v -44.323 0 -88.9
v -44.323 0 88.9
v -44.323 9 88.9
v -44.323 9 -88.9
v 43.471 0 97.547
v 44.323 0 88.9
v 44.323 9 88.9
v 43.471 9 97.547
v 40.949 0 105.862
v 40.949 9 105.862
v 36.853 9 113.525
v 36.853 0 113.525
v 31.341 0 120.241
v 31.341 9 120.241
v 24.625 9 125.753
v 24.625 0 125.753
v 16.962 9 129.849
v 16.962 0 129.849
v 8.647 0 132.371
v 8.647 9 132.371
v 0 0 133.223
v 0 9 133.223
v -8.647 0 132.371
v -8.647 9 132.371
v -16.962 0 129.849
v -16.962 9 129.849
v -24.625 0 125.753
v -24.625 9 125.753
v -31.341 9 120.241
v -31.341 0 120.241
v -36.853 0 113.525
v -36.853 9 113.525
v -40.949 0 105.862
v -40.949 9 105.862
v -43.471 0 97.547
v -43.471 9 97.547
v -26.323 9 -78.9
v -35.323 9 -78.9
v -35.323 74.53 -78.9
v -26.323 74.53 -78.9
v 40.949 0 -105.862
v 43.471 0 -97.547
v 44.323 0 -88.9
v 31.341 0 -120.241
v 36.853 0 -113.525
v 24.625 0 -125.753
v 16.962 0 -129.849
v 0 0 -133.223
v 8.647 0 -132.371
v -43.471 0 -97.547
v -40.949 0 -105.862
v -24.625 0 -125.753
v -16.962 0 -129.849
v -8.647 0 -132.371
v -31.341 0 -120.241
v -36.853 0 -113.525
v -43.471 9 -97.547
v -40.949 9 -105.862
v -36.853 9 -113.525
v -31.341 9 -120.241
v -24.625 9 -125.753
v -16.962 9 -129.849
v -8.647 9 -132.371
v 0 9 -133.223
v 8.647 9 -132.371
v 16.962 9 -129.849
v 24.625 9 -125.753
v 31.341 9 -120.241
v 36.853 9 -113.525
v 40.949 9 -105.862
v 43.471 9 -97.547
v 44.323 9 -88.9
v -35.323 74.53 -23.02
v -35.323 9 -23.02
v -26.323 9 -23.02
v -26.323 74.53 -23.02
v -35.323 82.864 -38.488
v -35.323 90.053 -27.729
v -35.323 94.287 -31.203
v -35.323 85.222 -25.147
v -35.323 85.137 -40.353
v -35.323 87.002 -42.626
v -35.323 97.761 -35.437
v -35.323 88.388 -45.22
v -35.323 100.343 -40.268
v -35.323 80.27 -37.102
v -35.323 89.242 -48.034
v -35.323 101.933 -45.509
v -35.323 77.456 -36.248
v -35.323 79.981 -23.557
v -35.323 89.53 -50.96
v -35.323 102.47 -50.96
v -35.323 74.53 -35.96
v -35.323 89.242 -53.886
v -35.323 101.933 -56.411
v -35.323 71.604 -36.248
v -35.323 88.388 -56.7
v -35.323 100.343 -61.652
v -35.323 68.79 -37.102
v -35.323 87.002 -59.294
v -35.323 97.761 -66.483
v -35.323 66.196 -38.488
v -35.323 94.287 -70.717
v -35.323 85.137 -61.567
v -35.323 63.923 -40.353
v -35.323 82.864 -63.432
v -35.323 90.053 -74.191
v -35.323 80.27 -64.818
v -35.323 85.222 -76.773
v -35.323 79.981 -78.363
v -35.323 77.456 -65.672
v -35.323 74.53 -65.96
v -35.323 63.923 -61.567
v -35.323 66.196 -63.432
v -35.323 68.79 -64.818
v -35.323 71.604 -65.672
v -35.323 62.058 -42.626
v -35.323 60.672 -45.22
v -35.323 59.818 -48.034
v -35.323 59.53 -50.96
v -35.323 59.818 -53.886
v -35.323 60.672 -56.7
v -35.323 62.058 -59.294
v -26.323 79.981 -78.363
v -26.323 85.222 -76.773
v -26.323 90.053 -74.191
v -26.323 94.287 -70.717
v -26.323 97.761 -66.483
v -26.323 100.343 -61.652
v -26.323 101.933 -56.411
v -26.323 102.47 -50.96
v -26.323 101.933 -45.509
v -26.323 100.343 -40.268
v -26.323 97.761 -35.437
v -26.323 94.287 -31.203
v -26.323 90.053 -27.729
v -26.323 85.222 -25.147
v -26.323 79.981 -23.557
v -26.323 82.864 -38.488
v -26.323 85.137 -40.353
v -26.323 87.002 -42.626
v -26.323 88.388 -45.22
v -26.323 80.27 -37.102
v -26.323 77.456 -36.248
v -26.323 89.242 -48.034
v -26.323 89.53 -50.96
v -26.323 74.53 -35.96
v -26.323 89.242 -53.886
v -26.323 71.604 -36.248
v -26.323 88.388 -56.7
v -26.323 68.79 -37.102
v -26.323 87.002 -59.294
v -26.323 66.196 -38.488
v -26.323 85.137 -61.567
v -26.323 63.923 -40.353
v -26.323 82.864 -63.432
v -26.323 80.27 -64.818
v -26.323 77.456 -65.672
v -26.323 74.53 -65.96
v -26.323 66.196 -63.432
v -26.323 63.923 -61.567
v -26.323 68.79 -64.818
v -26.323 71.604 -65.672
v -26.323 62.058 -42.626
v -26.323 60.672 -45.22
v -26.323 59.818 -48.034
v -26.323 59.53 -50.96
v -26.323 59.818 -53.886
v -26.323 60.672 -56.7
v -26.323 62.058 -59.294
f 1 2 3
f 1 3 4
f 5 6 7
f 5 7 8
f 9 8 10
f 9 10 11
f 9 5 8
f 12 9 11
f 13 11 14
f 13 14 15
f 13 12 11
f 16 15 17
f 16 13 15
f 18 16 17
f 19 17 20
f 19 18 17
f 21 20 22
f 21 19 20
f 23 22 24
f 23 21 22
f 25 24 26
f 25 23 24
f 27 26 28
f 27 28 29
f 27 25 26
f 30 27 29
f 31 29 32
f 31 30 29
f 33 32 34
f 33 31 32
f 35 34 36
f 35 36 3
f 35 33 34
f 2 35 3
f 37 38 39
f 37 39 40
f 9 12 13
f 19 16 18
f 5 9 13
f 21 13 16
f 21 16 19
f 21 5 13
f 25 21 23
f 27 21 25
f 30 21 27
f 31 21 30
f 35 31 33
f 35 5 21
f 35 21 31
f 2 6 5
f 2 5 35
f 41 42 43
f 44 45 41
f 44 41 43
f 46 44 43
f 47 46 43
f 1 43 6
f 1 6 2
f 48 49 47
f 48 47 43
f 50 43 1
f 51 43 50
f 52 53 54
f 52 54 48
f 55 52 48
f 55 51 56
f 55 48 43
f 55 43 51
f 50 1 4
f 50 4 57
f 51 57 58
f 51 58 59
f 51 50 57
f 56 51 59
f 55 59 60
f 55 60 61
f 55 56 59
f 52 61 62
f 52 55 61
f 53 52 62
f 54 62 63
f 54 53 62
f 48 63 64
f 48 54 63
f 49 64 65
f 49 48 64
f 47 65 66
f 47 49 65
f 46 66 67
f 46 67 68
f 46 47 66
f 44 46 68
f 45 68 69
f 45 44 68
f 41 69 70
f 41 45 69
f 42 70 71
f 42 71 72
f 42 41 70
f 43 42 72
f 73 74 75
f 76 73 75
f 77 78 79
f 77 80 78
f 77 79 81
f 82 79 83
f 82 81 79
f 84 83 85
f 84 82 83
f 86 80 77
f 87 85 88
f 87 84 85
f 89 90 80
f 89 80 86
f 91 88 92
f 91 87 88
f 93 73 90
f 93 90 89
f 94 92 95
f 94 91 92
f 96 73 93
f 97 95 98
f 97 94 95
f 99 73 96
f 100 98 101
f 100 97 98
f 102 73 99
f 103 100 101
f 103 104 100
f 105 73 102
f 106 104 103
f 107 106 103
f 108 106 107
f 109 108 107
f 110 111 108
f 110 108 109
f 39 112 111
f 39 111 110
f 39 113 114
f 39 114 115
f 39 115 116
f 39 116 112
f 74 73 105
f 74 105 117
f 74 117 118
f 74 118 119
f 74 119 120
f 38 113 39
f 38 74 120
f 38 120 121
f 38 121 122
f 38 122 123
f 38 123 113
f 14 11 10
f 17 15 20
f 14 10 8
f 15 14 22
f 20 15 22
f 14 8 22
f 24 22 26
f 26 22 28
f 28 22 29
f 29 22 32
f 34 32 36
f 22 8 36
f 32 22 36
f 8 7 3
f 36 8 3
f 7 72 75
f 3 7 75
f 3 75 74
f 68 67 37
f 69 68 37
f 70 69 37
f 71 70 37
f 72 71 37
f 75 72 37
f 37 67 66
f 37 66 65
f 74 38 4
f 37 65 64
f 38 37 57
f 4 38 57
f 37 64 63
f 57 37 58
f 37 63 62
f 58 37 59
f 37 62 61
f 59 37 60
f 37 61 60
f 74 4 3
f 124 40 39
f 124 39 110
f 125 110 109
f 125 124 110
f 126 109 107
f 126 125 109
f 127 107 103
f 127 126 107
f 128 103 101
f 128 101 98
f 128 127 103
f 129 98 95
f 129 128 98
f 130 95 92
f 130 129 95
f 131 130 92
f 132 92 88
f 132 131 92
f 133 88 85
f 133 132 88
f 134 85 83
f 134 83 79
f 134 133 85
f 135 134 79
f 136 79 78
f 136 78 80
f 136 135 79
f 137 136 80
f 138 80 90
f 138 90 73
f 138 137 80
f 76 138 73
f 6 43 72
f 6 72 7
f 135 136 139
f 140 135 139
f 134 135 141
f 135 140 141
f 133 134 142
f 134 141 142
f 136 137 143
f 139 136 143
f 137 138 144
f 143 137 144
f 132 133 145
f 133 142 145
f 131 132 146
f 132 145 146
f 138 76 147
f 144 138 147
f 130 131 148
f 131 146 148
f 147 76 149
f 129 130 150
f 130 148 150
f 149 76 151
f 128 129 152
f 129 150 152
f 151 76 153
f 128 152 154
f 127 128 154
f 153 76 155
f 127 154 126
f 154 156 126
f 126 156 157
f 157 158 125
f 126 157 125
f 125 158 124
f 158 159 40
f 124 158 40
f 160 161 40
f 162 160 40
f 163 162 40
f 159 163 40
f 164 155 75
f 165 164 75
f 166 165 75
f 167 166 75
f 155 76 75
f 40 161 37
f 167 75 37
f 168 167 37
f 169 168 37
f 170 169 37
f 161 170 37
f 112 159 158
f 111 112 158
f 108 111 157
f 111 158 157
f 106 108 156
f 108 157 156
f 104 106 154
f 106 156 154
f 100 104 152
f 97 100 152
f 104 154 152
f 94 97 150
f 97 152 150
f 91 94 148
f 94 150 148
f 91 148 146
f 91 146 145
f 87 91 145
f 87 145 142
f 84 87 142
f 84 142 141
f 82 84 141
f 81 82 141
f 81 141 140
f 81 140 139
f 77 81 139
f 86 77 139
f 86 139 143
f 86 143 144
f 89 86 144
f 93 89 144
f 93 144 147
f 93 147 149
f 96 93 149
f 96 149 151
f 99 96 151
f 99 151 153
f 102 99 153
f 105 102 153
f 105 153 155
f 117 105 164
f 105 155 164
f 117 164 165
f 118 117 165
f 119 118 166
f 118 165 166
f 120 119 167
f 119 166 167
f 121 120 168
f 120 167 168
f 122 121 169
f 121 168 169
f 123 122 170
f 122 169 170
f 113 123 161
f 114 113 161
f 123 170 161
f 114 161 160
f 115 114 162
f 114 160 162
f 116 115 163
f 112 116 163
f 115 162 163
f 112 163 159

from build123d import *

# Parameters (mm, degrees)
BOSS_EXTRUDE1_DEPTH = 9
SKETCH2_W           = 9
SKETCH2_H           = 55.88
BOSS_EXTRUDE2_DEPTH = 65.53
SKETCH3_R           = 27.94
BOSS_EXTRUDE3_DEPTH = 9
SKETCH4_R           = 15
CUT_EXTRUDE1_DEPTH  = 19


with BuildPart() as part:
    # Sketch1 → Boss-Extrude1 (new body)
    with BuildSketch(Plane(origin=(0, 0, 0), x_dir=(1, 0, 0), z_dir=(0, 1, 0))):
        with BuildLine():
            Line((44.323, 88.9), (44.323, -88.9))
            ThreePointArc((44.323, -88.9), (0, -133.223), (-44.323, -88.9))
            Line((-44.323, -88.9), (-44.323, 88.9))
            ThreePointArc((-44.323, 88.9), (0, 133.223), (44.323, 88.9))
        make_face()
    extrude(amount=BOSS_EXTRUDE1_DEPTH)

    # Sketch2 → Boss-Extrude2 (add)
    with BuildSketch(Plane(origin=(0, 9, 0), x_dir=(1, 0, 0), z_dir=(0, 1, 0))):
        with Locations((-30.823, 50.96)):
            Rectangle(SKETCH2_W, SKETCH2_H)
    extrude(amount=BOSS_EXTRUDE2_DEPTH)

    # Sketch3 → Boss-Extrude3 (add)
    with BuildSketch(Plane(origin=(-26.323, 0, 0), x_dir=(0, 0, -1), z_dir=(1, 0, 0))):
        with Locations((50.96, 74.53)):
            Circle(SKETCH3_R)
    extrude(amount=-BOSS_EXTRUDE3_DEPTH)

    # Sketch4 → Cut-Extrude1 (cut, through all)
    with BuildSketch(Plane(origin=(-26.323, 0, 0), x_dir=(0, 0, -1), z_dir=(1, 0, 0))):
        with Locations((50.96, 74.53)):
            Circle(SKETCH4_R)
    extrude(amount=-CUT_EXTRUDE1_DEPTH, mode=Mode.SUBTRACT)


solid = part.part
